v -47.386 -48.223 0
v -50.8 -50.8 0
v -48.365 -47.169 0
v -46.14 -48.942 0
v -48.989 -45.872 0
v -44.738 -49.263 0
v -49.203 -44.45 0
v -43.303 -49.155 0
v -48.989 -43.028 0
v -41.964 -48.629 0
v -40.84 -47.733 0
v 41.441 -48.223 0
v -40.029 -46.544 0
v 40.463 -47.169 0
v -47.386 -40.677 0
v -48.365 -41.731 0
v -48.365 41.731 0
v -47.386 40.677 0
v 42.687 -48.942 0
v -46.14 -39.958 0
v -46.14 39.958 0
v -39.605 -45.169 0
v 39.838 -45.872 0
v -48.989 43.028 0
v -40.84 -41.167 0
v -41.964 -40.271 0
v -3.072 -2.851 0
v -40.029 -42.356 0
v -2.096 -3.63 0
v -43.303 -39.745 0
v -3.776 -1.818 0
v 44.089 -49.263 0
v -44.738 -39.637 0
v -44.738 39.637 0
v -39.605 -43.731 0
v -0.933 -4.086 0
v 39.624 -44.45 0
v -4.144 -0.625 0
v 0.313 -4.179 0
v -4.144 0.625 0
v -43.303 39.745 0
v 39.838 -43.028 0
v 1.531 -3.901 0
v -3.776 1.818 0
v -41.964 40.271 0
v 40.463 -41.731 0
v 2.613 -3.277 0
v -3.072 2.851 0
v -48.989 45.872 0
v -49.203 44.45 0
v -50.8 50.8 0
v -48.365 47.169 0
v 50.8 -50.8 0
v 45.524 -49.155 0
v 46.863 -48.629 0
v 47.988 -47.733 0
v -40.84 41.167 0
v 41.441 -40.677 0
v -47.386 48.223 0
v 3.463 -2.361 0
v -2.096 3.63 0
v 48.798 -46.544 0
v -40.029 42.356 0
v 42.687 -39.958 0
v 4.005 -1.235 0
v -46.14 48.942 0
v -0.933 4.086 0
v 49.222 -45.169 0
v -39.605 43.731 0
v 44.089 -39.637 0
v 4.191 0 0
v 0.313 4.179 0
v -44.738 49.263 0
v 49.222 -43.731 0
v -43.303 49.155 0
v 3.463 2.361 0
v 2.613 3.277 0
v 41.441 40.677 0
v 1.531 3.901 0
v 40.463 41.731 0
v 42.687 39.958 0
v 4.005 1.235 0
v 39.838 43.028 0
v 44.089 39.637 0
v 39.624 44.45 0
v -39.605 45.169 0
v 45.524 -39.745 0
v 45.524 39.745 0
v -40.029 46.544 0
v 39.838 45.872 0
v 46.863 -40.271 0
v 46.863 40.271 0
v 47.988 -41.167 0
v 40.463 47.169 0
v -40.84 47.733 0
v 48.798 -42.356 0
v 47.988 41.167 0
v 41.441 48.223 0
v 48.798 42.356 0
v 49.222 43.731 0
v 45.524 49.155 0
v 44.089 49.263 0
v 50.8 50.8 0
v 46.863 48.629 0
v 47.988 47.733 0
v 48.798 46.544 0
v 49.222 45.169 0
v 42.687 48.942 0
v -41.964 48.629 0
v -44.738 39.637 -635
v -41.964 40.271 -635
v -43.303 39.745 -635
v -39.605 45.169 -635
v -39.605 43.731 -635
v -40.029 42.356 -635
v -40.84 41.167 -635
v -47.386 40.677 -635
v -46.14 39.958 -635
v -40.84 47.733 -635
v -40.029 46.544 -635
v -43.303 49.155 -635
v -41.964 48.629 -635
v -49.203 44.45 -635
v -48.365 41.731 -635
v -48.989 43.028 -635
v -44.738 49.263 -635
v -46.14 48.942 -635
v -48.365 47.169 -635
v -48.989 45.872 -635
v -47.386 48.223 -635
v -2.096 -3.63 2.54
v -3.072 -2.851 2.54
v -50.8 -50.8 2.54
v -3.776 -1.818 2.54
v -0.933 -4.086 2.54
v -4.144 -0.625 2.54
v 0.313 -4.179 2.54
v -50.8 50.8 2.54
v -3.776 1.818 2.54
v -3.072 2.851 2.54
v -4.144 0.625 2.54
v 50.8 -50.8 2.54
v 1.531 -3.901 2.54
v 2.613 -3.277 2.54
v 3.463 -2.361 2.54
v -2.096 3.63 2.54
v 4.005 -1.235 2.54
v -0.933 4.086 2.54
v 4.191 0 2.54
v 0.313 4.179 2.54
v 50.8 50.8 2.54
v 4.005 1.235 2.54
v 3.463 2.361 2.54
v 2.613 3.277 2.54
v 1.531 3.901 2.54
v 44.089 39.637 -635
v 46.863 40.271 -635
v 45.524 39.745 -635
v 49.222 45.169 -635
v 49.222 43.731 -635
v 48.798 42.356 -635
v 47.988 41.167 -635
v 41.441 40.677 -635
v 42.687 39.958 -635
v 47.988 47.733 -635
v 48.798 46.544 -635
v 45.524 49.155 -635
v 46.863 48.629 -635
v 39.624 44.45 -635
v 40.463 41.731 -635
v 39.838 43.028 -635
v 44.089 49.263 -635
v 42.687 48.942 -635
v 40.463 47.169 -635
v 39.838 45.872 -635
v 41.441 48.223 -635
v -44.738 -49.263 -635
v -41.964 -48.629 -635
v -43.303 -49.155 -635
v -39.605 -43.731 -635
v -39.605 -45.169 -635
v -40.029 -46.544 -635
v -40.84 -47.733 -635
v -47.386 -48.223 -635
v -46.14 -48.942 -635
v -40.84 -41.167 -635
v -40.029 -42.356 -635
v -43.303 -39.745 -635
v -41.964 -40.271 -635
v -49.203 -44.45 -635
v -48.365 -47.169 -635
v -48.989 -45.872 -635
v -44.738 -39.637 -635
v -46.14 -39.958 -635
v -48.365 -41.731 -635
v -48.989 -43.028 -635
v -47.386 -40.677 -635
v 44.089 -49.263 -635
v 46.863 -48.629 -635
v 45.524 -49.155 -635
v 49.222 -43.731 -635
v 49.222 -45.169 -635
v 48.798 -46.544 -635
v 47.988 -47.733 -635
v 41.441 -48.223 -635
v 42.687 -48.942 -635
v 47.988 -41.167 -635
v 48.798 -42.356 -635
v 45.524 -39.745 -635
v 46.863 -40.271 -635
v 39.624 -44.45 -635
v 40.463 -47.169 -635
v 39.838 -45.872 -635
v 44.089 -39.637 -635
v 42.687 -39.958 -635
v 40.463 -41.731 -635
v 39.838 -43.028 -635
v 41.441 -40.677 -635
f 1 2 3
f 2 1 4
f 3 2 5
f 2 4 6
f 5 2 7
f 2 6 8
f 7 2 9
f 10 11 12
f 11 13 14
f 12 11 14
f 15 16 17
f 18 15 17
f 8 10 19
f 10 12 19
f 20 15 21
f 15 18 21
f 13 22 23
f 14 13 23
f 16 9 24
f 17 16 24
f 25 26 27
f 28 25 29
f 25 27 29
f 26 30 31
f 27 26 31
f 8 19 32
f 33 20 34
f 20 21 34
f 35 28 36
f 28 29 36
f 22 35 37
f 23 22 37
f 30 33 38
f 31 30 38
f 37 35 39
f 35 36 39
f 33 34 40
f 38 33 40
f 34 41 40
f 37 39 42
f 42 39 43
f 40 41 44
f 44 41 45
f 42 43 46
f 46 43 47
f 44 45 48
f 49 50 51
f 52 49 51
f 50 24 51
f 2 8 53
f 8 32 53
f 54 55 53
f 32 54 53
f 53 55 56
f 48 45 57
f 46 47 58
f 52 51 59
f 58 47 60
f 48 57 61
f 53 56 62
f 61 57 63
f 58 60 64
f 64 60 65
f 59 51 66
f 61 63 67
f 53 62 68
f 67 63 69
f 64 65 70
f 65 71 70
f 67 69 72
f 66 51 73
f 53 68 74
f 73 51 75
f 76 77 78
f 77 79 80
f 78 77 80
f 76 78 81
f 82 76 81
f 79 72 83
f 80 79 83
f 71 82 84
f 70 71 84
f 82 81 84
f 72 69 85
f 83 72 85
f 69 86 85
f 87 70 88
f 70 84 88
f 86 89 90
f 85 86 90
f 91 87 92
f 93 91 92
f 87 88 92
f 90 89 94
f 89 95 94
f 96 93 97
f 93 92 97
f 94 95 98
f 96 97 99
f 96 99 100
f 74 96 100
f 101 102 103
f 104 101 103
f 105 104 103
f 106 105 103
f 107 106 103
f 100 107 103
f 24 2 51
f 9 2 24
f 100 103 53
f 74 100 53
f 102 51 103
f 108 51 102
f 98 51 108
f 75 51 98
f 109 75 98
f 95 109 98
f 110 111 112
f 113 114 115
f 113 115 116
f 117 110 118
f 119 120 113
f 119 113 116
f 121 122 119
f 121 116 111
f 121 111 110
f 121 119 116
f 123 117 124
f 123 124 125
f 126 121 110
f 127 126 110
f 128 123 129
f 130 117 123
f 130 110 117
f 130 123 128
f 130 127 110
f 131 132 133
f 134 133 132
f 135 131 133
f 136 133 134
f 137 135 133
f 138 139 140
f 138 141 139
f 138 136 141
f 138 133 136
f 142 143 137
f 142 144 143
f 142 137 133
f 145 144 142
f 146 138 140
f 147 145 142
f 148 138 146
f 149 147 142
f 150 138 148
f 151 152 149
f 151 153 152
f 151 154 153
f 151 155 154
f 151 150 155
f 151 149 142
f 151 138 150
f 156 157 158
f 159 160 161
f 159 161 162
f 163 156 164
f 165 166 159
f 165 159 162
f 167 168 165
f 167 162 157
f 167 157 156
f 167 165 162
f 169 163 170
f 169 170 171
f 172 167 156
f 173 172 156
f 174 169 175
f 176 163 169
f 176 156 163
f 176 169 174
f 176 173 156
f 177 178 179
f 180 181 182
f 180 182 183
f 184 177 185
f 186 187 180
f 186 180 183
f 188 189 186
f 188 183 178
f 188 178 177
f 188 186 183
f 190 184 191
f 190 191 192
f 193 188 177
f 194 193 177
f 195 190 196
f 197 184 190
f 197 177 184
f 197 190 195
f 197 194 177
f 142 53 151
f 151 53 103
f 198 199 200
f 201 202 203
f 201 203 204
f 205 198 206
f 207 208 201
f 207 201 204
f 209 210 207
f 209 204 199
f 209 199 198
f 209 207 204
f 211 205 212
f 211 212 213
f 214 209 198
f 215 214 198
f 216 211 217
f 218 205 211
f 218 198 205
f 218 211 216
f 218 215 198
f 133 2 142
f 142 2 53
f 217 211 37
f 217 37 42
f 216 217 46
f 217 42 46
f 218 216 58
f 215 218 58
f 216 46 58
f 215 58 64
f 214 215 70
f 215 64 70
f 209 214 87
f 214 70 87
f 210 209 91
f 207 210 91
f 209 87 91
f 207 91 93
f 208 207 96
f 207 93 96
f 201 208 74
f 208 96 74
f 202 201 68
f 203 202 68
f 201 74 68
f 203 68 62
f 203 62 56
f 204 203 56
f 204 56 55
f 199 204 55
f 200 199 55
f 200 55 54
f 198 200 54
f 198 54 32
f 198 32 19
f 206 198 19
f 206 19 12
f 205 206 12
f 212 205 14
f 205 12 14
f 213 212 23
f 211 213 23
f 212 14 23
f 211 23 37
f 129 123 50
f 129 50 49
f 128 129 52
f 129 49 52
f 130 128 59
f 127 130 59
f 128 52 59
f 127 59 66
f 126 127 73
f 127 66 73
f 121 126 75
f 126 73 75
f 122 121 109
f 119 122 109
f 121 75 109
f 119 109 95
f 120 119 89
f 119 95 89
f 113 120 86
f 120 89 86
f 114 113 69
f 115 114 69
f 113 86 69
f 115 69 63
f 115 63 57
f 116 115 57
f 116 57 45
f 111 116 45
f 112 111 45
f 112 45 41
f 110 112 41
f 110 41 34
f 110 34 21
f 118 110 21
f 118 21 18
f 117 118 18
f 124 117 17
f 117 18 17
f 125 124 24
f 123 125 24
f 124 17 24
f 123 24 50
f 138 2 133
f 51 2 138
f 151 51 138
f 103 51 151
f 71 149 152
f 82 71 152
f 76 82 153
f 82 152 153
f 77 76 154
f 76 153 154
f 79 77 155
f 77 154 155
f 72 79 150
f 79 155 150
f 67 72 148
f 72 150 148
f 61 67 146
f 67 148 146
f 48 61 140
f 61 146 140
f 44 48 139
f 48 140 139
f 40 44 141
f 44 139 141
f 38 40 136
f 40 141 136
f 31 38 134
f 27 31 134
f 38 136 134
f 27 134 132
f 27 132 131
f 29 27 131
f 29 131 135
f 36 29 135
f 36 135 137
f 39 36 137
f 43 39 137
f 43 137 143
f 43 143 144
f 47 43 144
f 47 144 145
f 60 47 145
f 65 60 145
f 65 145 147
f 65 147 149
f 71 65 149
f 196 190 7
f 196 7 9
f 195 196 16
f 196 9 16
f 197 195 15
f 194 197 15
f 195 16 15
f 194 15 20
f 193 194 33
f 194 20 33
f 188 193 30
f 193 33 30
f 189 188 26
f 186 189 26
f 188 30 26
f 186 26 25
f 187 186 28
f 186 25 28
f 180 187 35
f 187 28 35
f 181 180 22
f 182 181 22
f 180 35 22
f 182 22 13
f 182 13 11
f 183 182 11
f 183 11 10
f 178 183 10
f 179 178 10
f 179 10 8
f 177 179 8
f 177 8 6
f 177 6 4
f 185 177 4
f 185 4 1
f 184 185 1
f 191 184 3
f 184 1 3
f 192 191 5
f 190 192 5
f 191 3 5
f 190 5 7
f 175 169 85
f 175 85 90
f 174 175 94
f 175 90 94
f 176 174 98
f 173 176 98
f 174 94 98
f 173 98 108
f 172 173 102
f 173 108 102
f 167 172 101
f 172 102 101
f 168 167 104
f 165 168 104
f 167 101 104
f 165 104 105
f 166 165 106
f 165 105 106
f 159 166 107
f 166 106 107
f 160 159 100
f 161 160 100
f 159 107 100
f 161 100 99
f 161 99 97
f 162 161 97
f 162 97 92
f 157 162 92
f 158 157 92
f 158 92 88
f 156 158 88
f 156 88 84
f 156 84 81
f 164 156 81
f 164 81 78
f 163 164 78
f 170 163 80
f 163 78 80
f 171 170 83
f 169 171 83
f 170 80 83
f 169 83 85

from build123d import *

# Parameters (mm, degrees)
SKETCH1_W           = 101.6
SKETCH1_H           = 101.6
BOSS_EXTRUDE1_DEPTH = 2.54
SKETCH2_R           = 4.826
BOSS_EXTRUDE2_DEPTH = 635
SKETCH3_R           = 4.191
CUT_EXTRUDE1_DEPTH  = 635


with BuildPart() as part:
    # Sketch1 → Boss-Extrude1 (new body)
    with BuildSketch(Plane.XY):
        Rectangle(SKETCH1_W, SKETCH1_H)
    extrude(amount=BOSS_EXTRUDE1_DEPTH)

    # Sketch2 → Boss-Extrude2 (add)
    with BuildSketch(Plane(origin=(0, 0, 0), x_dir=(-1, 0, 0), z_dir=(0, 0, -1))):
        with Locations((-44.45, 44.45)):
            Circle(SKETCH2_R)
        with Locations((44.377290972, 44.45)):
            Circle(SKETCH2_R)
        with Locations((44.377290972, -44.45)):
            Circle(SKETCH2_R)
        with Locations((-44.45, -44.45)):
            Circle(SKETCH2_R)
    extrude(amount=BOSS_EXTRUDE2_DEPTH)

    # Sketch3 → Cut-Extrude1 (cut)
    with BuildSketch(Plane.XY.offset(2.54)):
        Circle(SKETCH3_R)
    extrude(amount=-CUT_EXTRUDE1_DEPTH, mode=Mode.SUBTRACT)


solid = part.part
